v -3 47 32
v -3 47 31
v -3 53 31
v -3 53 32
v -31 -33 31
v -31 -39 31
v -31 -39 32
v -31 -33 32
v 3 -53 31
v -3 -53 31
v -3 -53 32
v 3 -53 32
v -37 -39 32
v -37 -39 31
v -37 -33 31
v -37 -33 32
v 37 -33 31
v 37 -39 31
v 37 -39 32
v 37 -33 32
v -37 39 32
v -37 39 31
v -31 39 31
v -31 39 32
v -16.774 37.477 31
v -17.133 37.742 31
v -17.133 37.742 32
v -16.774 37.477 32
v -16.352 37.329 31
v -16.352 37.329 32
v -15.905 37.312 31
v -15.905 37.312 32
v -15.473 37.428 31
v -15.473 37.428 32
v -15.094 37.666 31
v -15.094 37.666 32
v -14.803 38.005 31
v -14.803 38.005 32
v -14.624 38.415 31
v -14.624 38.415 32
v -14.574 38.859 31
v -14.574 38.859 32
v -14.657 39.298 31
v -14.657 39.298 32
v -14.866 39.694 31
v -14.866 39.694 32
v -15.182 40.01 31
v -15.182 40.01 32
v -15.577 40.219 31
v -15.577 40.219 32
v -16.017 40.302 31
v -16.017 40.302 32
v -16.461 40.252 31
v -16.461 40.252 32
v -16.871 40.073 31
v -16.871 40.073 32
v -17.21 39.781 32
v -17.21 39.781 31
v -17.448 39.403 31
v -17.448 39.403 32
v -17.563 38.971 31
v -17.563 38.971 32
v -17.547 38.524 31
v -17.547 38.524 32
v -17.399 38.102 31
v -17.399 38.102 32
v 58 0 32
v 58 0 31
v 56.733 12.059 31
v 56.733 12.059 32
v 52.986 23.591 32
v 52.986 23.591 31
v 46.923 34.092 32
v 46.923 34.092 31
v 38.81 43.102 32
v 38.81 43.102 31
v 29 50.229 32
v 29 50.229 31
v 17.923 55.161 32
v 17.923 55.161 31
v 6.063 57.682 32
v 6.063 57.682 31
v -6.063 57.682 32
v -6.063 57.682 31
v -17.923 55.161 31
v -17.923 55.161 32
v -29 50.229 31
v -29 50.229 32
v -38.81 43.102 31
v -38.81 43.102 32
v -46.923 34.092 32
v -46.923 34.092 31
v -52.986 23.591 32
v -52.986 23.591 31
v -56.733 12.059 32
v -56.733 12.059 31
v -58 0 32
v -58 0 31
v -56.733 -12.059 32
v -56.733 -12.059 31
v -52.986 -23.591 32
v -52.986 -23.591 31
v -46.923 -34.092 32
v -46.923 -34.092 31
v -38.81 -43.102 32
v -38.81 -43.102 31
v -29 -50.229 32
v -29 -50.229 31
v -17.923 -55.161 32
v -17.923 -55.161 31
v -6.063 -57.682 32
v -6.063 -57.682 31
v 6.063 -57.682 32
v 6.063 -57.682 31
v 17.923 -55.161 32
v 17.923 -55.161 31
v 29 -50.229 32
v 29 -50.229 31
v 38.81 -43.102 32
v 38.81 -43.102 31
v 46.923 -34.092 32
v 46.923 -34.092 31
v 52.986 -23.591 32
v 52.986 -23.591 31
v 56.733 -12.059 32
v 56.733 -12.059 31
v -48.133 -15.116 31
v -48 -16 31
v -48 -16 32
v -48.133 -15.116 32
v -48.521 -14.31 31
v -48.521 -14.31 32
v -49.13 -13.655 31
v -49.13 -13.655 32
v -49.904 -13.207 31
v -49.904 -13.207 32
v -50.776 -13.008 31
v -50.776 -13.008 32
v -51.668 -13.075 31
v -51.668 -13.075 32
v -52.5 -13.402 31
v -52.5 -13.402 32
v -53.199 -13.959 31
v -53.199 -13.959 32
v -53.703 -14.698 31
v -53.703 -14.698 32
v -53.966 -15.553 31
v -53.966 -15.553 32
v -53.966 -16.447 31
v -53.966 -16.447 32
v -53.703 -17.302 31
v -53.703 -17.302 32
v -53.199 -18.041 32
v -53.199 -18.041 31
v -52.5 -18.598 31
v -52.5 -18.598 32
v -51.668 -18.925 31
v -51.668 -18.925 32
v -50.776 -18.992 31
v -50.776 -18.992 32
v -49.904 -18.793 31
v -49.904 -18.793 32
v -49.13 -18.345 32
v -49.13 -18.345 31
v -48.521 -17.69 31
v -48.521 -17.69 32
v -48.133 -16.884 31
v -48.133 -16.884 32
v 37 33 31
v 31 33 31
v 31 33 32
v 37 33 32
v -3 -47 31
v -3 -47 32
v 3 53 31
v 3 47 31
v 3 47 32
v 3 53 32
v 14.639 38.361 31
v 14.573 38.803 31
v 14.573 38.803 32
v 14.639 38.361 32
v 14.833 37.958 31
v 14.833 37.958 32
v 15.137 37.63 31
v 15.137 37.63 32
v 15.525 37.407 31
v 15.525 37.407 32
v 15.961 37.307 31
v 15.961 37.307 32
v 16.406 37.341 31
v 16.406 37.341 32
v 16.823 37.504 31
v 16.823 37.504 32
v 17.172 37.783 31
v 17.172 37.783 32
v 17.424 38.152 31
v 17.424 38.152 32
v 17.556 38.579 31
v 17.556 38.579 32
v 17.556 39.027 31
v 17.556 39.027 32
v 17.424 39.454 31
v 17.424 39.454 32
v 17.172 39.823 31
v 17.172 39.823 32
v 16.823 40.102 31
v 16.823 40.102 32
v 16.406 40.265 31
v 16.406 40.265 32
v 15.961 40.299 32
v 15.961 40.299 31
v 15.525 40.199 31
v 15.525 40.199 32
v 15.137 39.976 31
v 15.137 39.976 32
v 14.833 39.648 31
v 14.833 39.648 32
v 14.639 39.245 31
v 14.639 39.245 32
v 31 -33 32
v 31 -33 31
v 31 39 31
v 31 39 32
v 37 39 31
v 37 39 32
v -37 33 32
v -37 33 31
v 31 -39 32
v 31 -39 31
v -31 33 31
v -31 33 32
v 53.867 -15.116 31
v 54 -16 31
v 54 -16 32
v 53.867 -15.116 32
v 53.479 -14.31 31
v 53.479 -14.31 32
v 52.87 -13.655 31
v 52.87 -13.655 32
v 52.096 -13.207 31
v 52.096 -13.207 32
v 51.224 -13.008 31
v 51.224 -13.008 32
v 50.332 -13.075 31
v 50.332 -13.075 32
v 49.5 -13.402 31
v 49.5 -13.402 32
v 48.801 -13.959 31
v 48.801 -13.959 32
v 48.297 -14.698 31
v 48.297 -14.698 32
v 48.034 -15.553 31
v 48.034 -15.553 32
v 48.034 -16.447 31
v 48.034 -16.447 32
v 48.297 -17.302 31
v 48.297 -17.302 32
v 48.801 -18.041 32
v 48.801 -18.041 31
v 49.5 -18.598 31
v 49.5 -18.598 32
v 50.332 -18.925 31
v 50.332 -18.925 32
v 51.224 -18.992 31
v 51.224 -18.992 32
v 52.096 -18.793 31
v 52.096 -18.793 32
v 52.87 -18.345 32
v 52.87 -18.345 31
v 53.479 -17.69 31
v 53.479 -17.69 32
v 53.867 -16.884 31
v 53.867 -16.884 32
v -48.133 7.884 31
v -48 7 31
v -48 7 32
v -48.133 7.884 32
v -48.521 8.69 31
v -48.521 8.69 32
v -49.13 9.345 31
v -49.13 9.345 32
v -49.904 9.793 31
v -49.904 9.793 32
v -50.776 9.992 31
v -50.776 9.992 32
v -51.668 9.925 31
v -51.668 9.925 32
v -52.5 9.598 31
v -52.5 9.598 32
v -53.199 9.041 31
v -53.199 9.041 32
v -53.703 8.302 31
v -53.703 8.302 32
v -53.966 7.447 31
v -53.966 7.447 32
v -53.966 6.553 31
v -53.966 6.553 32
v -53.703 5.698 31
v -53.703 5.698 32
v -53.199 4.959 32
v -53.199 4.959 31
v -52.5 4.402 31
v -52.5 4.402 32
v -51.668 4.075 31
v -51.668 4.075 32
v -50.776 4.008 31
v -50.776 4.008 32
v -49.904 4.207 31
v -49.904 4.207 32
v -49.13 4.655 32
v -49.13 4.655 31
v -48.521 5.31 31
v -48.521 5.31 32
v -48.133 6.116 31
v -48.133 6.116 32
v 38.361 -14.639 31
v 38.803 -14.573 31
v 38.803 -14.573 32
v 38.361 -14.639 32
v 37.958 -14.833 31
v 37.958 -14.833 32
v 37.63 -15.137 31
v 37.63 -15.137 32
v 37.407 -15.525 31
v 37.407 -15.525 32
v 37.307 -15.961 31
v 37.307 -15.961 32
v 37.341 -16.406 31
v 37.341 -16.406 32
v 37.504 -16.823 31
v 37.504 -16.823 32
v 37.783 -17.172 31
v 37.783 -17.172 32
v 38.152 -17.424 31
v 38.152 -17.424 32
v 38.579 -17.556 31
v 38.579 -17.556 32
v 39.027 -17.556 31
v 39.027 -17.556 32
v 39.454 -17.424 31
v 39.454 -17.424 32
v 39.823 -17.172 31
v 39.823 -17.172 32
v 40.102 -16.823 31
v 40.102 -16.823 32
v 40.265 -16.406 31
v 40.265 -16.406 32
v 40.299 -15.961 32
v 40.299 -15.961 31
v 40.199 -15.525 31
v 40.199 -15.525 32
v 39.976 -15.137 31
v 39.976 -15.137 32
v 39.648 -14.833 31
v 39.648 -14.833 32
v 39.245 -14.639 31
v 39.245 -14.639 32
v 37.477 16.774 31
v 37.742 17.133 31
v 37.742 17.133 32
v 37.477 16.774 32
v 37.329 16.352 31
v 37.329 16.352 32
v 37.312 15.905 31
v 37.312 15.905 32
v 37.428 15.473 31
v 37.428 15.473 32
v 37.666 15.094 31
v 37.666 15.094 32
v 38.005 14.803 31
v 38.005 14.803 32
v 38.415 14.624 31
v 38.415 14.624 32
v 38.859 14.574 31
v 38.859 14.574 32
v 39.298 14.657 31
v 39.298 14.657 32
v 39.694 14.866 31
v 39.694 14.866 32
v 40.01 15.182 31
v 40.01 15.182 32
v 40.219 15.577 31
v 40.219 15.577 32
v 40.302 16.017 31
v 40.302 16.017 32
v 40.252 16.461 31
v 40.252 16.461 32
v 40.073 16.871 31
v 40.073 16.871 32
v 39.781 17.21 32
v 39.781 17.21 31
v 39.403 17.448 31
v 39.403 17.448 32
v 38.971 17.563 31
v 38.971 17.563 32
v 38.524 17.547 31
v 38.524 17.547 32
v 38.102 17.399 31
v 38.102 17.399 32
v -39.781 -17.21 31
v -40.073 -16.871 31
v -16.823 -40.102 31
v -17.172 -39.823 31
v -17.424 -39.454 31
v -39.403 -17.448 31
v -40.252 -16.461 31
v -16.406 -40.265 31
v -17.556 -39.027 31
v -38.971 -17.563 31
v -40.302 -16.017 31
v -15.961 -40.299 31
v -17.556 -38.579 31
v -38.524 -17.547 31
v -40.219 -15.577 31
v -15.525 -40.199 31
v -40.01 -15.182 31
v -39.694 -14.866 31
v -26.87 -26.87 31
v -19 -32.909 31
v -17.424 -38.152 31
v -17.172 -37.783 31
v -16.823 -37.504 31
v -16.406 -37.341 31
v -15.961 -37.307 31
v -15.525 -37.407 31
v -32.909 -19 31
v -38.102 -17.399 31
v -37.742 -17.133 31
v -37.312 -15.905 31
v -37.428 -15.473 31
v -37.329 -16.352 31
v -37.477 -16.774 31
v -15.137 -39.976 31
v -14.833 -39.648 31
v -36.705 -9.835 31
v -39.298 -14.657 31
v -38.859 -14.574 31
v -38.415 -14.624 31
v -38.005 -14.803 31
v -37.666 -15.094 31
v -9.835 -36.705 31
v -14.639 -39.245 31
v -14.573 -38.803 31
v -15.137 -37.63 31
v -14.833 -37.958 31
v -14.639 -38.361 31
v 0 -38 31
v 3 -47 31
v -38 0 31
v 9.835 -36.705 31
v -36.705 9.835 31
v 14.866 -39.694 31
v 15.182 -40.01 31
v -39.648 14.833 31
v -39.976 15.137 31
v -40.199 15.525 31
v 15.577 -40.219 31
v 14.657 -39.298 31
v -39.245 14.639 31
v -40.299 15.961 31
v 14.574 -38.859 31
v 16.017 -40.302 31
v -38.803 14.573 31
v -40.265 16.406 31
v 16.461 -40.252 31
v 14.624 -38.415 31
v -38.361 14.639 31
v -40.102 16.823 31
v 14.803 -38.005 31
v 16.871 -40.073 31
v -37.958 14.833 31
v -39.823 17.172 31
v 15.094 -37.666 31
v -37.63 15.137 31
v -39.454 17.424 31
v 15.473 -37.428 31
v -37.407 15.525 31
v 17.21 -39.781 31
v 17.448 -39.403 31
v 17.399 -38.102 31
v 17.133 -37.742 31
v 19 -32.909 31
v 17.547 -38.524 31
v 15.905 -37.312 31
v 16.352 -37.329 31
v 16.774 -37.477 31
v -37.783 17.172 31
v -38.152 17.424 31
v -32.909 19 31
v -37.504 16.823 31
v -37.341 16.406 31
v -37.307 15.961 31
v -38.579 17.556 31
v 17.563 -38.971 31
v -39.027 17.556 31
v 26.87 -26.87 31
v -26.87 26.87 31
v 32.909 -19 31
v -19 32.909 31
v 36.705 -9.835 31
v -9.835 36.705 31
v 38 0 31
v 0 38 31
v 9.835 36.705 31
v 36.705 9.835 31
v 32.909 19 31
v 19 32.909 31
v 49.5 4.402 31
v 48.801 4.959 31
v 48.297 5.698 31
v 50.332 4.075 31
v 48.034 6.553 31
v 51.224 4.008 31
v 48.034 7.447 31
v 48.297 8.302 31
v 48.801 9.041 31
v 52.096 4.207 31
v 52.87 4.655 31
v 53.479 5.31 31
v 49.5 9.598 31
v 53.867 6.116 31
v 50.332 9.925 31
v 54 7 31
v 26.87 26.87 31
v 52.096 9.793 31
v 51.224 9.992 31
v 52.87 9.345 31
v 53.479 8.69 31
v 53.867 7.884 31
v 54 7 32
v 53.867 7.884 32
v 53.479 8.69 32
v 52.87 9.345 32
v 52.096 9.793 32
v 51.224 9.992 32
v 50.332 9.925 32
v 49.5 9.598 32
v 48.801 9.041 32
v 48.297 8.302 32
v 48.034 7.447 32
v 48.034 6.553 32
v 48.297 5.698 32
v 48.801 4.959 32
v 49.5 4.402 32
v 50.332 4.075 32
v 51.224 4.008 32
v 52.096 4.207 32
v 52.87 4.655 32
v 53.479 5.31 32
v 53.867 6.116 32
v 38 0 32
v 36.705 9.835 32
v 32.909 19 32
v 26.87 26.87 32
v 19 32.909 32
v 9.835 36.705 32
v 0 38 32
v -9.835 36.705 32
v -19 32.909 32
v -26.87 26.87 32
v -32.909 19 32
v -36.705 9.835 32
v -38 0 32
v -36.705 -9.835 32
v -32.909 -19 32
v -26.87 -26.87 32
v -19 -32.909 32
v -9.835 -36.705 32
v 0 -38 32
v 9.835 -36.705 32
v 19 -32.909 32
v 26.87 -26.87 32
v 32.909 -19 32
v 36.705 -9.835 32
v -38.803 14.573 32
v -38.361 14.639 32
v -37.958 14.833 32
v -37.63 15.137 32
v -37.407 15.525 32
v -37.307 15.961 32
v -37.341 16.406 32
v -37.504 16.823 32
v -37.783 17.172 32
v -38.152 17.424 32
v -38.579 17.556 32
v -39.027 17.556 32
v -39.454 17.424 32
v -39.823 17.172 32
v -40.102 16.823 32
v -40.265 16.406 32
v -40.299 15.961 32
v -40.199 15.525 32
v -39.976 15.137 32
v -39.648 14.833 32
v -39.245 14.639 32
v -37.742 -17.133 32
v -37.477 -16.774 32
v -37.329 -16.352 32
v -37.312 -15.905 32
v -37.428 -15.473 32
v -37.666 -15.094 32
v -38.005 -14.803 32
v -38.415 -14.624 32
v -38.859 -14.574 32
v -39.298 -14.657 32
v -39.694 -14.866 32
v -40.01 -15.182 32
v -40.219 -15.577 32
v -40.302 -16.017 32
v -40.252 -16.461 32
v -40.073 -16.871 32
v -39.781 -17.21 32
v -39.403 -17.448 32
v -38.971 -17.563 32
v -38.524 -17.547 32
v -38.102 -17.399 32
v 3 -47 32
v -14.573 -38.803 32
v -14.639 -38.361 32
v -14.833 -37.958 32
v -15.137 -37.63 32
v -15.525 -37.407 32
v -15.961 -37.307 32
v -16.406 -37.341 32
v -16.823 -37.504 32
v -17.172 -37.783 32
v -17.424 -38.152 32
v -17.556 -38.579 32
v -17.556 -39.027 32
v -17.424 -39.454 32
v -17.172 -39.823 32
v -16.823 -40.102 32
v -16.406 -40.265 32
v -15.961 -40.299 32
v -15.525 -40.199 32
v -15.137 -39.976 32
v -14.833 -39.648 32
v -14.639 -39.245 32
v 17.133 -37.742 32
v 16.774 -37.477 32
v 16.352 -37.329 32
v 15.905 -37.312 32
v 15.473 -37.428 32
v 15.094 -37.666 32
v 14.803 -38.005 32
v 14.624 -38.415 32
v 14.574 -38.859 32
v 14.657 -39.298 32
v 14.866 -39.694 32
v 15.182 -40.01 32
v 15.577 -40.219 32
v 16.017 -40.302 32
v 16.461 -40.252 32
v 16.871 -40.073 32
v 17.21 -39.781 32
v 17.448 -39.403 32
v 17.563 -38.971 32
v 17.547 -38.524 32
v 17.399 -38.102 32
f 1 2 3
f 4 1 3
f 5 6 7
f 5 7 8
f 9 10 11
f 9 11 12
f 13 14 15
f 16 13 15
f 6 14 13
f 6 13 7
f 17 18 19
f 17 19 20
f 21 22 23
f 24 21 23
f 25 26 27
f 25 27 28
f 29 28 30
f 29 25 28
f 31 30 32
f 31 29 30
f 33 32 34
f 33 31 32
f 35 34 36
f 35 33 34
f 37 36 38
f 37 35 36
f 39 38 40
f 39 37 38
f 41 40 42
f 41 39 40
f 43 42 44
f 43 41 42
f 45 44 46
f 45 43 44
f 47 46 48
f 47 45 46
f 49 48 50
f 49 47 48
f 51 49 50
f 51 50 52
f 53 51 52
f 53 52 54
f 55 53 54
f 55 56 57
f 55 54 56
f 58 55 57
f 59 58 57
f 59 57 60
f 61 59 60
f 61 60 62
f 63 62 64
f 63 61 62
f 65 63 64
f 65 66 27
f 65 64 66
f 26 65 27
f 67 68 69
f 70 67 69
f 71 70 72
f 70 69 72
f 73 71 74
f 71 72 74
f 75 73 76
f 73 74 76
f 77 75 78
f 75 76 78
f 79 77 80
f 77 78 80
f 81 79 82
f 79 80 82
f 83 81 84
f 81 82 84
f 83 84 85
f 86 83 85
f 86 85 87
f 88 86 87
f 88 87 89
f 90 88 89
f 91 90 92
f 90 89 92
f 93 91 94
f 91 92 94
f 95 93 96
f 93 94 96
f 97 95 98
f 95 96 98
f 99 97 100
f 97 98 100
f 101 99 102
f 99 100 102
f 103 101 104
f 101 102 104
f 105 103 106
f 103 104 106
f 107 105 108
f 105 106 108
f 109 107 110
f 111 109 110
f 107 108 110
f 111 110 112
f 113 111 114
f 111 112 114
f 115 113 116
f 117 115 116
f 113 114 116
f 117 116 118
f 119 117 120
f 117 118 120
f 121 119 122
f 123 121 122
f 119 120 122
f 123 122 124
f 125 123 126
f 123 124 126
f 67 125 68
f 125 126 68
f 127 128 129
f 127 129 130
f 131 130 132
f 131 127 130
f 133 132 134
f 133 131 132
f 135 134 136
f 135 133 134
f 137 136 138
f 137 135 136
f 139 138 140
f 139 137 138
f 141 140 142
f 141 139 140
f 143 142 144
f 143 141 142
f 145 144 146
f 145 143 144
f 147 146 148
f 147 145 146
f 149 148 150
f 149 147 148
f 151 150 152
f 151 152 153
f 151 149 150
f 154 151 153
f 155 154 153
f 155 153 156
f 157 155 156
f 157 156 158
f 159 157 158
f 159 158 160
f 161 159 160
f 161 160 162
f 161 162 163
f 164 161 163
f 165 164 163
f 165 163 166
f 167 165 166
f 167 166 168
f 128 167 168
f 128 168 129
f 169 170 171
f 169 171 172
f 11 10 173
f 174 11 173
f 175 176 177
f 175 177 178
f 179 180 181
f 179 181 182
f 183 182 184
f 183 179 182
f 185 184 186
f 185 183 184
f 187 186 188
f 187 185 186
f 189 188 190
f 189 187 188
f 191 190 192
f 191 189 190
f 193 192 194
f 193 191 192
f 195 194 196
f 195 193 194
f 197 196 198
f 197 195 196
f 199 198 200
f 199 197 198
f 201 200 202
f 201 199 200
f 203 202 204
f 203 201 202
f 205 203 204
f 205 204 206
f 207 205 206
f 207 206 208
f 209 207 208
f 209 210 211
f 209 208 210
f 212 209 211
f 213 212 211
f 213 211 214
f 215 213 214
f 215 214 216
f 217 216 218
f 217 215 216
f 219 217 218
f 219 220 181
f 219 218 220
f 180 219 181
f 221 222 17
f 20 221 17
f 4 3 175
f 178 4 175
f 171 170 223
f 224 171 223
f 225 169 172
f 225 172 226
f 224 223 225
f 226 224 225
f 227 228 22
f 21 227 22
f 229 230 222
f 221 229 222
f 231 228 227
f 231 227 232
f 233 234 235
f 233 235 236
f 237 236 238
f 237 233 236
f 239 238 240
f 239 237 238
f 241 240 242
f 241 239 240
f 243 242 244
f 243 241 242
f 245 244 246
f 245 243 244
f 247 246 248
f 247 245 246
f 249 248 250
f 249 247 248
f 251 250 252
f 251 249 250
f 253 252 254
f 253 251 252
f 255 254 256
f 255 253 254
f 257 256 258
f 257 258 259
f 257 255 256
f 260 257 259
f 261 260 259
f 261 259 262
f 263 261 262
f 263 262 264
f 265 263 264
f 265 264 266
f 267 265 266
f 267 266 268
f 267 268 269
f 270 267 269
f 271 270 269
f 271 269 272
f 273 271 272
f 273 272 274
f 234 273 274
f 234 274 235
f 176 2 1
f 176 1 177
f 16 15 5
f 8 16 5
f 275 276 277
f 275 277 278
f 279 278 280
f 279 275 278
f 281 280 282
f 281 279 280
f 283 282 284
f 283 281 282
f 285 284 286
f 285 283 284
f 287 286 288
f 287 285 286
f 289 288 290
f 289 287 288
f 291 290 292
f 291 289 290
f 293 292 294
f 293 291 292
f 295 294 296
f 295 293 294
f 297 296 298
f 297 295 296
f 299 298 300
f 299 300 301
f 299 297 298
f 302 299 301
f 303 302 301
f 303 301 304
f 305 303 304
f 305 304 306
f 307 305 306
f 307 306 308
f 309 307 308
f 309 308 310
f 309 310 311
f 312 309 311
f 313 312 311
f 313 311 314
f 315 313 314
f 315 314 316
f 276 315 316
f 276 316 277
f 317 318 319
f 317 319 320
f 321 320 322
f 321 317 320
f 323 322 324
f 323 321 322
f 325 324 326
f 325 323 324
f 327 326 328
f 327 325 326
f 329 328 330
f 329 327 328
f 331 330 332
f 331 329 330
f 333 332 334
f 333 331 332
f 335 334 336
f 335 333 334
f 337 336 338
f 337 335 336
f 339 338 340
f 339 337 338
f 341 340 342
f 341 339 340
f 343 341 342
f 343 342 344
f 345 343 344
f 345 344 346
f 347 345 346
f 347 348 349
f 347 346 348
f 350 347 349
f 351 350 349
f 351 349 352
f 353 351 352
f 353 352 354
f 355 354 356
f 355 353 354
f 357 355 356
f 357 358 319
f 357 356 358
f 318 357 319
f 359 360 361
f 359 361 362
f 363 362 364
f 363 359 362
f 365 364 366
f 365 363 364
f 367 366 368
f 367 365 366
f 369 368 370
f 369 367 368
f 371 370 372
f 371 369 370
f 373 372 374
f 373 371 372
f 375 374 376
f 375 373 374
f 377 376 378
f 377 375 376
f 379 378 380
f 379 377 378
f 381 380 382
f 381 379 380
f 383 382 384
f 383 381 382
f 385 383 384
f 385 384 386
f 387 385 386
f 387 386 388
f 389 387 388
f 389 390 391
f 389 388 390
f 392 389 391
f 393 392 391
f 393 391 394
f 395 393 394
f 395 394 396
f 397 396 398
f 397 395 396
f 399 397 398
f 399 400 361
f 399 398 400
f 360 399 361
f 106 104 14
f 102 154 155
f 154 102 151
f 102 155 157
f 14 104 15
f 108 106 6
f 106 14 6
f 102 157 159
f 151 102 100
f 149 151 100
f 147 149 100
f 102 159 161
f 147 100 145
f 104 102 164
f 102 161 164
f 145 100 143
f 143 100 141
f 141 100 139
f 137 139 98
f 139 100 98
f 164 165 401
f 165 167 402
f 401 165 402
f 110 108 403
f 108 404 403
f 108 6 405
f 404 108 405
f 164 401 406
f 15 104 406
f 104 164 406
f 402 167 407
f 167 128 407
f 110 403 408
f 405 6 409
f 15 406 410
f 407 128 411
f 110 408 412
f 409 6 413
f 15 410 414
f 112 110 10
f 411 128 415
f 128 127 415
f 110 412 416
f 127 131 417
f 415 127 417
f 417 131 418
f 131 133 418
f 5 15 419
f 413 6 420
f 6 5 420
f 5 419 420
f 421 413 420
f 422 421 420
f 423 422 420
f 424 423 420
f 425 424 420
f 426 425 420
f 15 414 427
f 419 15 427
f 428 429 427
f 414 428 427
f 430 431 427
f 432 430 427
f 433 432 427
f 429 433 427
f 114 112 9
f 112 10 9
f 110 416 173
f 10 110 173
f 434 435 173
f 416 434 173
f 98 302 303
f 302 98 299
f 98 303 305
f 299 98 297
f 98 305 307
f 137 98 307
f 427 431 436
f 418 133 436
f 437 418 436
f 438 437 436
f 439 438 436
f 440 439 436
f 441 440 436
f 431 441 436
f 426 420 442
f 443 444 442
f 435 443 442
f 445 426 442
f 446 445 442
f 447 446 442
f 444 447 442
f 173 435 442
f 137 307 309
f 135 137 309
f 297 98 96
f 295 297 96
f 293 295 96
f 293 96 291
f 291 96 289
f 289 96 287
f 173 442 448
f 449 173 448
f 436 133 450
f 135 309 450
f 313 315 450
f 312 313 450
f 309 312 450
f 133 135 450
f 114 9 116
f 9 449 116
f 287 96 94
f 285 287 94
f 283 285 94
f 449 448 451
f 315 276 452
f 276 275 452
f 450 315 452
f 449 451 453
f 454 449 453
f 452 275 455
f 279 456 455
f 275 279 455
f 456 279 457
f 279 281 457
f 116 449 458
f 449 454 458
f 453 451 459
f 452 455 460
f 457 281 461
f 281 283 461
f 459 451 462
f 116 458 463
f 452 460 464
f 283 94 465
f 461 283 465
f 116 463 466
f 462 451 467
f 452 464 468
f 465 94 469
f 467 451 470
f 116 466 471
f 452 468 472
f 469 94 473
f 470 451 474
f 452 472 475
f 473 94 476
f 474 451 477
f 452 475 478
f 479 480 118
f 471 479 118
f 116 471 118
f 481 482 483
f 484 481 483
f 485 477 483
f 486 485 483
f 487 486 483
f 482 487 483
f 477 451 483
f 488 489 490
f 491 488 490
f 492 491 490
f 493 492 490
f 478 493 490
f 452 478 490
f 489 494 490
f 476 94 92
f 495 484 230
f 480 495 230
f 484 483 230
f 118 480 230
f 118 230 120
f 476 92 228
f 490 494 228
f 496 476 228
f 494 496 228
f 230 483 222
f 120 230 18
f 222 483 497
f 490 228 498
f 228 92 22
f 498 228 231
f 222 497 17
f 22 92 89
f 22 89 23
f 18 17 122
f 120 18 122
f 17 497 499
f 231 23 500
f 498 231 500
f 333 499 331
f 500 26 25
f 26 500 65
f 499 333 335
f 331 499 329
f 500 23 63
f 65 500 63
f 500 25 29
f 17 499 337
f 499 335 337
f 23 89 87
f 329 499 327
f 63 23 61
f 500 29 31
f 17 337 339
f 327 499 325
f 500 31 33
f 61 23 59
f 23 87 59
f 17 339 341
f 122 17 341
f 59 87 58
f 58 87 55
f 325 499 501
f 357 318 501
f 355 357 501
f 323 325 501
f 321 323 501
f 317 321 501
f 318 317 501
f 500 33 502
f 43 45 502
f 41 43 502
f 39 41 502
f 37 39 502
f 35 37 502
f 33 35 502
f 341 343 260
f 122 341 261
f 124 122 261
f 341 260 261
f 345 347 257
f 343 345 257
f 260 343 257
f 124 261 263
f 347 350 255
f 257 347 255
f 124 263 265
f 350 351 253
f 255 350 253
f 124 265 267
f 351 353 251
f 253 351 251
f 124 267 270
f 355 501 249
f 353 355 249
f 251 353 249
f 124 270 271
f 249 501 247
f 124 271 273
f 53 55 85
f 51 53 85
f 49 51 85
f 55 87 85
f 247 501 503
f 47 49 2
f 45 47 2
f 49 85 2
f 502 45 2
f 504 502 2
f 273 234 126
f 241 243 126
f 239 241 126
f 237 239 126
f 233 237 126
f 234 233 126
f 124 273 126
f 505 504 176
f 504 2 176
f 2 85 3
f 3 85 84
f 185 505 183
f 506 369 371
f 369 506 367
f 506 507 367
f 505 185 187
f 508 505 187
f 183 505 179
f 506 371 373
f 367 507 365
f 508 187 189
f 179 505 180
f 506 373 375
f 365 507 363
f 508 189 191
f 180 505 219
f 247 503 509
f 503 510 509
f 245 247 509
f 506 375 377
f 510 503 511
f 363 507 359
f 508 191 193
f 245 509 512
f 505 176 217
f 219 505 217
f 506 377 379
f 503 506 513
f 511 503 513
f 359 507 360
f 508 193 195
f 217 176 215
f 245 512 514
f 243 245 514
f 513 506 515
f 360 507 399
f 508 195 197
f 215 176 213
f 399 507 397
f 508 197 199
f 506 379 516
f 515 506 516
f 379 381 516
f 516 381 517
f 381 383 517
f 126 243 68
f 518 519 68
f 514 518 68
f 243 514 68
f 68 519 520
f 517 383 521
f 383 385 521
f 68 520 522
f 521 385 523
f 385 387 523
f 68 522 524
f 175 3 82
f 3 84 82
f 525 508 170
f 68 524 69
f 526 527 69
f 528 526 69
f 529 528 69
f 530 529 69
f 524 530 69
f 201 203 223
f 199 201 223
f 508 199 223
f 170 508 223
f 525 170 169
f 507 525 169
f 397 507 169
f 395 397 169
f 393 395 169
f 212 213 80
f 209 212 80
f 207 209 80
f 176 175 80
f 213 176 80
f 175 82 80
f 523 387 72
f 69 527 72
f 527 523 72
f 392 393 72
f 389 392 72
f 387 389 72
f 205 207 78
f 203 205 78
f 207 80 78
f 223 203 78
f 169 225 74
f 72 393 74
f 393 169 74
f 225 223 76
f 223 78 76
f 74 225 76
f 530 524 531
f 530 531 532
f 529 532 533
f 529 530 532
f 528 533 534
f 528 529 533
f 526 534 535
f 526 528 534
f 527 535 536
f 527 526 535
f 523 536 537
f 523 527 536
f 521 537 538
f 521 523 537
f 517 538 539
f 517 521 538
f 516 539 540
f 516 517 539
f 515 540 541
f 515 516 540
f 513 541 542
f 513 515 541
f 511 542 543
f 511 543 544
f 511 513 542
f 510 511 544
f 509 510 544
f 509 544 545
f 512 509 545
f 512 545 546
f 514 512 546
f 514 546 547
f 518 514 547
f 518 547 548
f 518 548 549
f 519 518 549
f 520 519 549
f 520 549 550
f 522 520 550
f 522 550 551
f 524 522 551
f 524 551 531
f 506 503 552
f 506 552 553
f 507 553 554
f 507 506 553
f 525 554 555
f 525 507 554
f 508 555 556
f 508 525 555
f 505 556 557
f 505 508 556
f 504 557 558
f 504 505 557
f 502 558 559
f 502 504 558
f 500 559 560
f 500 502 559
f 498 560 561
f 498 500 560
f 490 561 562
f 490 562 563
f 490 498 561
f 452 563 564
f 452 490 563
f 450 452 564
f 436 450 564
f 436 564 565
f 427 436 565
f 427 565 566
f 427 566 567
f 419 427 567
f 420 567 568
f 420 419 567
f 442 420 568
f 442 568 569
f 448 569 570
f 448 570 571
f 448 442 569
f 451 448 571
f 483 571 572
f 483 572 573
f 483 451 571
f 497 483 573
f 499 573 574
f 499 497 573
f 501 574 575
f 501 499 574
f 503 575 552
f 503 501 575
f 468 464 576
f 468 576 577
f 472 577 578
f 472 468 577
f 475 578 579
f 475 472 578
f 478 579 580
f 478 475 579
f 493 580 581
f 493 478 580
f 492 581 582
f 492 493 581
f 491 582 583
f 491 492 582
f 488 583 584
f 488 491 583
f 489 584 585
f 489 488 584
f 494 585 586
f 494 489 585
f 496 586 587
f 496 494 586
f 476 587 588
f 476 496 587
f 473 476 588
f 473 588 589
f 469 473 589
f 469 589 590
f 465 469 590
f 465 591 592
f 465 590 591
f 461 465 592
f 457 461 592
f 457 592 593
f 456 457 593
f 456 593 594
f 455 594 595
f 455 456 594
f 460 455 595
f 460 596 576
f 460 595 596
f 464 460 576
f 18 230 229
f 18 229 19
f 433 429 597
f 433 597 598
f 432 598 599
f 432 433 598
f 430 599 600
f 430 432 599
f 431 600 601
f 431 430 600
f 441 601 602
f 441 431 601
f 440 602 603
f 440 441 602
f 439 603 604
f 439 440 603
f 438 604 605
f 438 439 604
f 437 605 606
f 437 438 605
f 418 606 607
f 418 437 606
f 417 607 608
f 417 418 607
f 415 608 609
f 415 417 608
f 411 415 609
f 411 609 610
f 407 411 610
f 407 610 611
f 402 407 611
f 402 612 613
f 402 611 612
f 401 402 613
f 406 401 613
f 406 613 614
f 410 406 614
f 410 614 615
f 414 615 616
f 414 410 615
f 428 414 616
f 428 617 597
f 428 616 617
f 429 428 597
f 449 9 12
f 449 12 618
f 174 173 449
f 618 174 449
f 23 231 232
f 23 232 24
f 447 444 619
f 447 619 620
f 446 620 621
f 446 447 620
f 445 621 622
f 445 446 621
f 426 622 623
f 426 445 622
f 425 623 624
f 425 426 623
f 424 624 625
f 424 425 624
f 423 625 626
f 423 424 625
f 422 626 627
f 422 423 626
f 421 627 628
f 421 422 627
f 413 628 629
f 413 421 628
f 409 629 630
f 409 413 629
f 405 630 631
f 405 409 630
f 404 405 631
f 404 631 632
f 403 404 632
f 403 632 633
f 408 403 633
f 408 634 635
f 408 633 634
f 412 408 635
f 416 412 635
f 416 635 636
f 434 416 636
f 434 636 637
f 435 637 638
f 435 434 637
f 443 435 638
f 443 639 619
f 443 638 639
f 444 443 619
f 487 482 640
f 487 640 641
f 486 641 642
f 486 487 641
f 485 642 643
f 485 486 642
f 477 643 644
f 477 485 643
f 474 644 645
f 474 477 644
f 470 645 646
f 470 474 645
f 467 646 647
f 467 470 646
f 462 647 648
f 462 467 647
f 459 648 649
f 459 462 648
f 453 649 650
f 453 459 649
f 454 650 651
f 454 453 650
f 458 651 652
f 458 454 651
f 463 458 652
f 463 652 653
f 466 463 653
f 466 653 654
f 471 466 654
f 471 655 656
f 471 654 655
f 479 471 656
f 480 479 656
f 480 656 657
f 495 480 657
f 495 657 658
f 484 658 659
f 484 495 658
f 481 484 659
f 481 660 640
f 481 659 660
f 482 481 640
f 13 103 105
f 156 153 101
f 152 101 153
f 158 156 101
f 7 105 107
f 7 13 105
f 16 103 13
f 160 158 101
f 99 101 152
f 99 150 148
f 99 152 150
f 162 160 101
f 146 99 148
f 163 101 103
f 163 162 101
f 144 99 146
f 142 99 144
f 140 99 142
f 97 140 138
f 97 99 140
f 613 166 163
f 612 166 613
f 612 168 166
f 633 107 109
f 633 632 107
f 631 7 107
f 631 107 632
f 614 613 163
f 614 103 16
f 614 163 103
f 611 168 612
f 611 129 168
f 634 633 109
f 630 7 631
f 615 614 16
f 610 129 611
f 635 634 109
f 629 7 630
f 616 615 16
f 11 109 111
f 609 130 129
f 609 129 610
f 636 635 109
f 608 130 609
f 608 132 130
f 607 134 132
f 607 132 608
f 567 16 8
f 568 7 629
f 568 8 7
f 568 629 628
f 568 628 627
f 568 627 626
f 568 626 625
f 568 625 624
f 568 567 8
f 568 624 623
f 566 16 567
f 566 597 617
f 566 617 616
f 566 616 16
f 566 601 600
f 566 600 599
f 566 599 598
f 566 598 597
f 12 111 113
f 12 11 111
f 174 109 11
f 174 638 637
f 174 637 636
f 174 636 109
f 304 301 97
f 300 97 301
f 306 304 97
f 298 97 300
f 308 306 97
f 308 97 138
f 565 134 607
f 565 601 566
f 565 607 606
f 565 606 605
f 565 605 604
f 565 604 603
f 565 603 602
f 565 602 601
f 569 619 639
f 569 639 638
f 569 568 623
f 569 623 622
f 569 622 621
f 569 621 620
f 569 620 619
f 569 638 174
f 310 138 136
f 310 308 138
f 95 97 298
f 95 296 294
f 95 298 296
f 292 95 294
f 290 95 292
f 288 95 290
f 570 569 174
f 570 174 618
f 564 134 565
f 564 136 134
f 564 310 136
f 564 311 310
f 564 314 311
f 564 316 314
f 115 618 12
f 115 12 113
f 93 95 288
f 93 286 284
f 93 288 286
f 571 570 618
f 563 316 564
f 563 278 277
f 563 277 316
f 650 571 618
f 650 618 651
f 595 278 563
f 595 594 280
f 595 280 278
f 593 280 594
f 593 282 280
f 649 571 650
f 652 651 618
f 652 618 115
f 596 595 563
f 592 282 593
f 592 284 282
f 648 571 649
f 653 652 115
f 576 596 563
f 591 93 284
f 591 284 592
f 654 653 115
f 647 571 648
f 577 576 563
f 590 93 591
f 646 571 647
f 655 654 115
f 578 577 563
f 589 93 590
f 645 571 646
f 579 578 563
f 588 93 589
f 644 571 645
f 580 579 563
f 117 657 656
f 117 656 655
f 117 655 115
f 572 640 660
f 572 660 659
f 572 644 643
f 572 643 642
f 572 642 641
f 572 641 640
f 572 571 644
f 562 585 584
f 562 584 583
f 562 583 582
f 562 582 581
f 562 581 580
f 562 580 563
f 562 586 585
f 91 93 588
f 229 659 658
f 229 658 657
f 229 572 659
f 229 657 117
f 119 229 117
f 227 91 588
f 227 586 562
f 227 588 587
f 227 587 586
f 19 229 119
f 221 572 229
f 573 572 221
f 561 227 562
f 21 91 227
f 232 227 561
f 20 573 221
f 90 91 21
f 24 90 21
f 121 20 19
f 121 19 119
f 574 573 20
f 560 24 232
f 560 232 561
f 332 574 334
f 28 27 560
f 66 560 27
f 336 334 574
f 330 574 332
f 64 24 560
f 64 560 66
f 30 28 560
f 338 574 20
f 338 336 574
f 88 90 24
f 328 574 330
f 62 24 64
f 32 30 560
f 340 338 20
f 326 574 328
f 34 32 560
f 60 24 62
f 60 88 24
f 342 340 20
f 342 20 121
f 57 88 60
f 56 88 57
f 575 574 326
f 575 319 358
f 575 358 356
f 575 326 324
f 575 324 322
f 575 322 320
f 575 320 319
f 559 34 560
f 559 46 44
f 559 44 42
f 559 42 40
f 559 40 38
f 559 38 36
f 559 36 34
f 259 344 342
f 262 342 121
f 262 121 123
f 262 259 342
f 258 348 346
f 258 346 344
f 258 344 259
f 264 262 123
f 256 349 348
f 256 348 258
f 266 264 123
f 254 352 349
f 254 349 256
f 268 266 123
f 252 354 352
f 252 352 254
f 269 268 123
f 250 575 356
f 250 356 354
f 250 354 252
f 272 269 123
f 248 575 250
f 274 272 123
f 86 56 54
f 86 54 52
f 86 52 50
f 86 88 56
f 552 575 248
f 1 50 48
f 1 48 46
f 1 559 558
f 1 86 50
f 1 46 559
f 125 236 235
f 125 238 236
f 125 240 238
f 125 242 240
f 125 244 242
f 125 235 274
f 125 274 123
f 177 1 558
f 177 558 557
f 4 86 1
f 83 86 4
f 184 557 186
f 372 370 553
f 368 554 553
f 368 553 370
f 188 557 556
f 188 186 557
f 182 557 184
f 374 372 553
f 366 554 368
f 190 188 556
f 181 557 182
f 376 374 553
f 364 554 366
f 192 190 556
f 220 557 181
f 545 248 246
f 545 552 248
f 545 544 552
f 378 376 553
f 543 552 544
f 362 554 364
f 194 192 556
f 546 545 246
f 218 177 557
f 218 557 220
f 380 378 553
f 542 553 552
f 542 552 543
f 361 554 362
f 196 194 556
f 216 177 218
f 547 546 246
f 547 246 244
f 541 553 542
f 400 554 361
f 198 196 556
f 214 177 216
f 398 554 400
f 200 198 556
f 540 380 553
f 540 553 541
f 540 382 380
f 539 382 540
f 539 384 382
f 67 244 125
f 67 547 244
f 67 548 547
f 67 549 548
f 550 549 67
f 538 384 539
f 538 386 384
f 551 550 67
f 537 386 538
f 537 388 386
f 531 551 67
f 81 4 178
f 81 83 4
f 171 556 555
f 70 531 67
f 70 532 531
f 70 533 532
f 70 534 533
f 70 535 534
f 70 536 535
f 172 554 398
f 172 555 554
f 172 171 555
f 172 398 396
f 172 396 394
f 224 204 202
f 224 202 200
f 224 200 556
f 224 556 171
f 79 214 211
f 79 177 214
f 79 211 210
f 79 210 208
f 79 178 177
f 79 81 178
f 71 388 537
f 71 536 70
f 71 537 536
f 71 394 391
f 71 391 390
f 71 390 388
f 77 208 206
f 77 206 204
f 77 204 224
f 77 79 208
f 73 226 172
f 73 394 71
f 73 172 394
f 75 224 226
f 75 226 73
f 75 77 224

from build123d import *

# Parameters (mm, degrees)
CYLINDER445_R               = 1.5
CYLINDER445_DEPTH           = 100
CYLINDER446_R               = 1.5
CYLINDER446_DEPTH           = 100
CYLINDER446_PLACEMENT_ANGLE = 135
CYLINDER447_R               = 1.5
CYLINDER447_DEPTH           = 100
CYLINDER448_R               = 1.5
CYLINDER448_DEPTH           = 100
CYLINDER448_PLACEMENT_ANGLE = 225
CYLINDER449_R               = 1.5
CYLINDER449_DEPTH           = 100
CYLINDER450_R               = 1.5
CYLINDER450_DEPTH           = 100
CYLINDER450_PLACEMENT_ANGLE = 45
CYLINDER451_R               = 1.5
CYLINDER451_DEPTH           = 100
CYLINDER444_R               = 1.5
CYLINDER444_DEPTH           = 100
CYLINDER444_PLACEMENT_ANGLE = 45
BOX154_W                    = 6
BOX154_H                    = 6
BOX154_DEPTH                = 10
BOX151_W                    = 6
BOX151_H                    = 6
BOX151_DEPTH                = 10
BOX155_W                    = 6
BOX155_H                    = 6
BOX155_DEPTH                = 10
BOX153_W                    = 6
BOX153_H                    = 6
BOX153_DEPTH                = 10
BOX156_W                    = 6
BOX156_H                    = 6
BOX156_DEPTH                = 10
BOX152_W                    = 6
BOX152_H                    = 6
BOX152_DEPTH                = 10
CYLINDER407_R               = 3
CYLINDER407_DEPTH           = 7
CYLINDER405_R               = 3
CYLINDER405_DEPTH           = 7
CYLINDER404_R               = 3
CYLINDER404_DEPTH           = 7
CYLINDER406_R               = 3
CYLINDER406_DEPTH           = 7
TUBE020_R                   = 58
TUBE020_R_2                 = 38
TUBE020_DEPTH               = 1


with BuildPart() as v_lec445:
    # Cylinder445 → Cylinder445 (new body)
    with BuildSketch(Plane(origin=(38.80294, -16.072704, 0), x_dir=(0, 1, 0), z_dir=(0, 0, 1))):
        Circle(CYLINDER445_R)
    extrude(amount=CYLINDER445_DEPTH)


with BuildPart() as v_lec446:
    # Cylinder446 → Cylinder446 (new body)
    with BuildSketch(Plane.XY):
        Circle(CYLINDER446_R)
    extrude(amount=CYLINDER446_DEPTH)


with BuildPart() as v_lec446_1:
    # Cylinder446 placement: moved
    add(v_lec446.part.moved(Location((38.80294, 16.072704, 0))).rotate(Axis((38.80294, 16.072704, 0), (0, 0, 1)), CYLINDER446_PLACEMENT_ANGLE))


with BuildPart() as v_lec447:
    # Cylinder447 → Cylinder447 (new body)
    with BuildSketch(Plane(origin=(16.072704, 38.80294, 0), x_dir=(-1, 0, 0), z_dir=(0, 0, 1))):
        Circle(CYLINDER447_R)
    extrude(amount=CYLINDER447_DEPTH)


with BuildPart() as v_lec448:
    # Cylinder448 → Cylinder448 (new body)
    with BuildSketch(Plane.XY):
        Circle(CYLINDER448_R)
    extrude(amount=CYLINDER448_DEPTH)


with BuildPart() as v_lec448_1:
    # Cylinder448 placement: moved
    add(v_lec448.part.moved(Location((-16.072704, 38.80294, 0))).rotate(Axis((-16.072704, 38.80294, 0), (0, 0, 1)), CYLINDER448_PLACEMENT_ANGLE))


with BuildPart() as v_lec449:
    # Cylinder449 → Cylinder449 (new body)
    with BuildSketch(Plane(origin=(-38.80294, 16.072704, 0), x_dir=(0, -1, 0), z_dir=(0, 0, 1))):
        Circle(CYLINDER449_R)
    extrude(amount=CYLINDER449_DEPTH)


with BuildPart() as v_lec450:
    # Cylinder450 → Cylinder450 (new body)
    with BuildSketch(Plane.XY):
        Circle(CYLINDER450_R)
    extrude(amount=CYLINDER450_DEPTH)


with BuildPart() as v_lec450_1:
    # Cylinder450 placement: moved
    add(v_lec450.part.moved(Location((-38.80294, -16.072704, 0))).rotate(Axis((-38.80294, -16.072704, 0), (0, 0, -1)), CYLINDER450_PLACEMENT_ANGLE))


with BuildPart() as v_lec451:
    # Cylinder451 → Cylinder451 (new body)
    with BuildSketch(Plane(origin=(-16.072704, -38.80294, 0), x_dir=(1, 0, 0), z_dir=(0, 0, 1))):
        Circle(CYLINDER451_R)
    extrude(amount=CYLINDER451_DEPTH)


with BuildPart() as compound325:
    # Cylinder444 → Cylinder444 (new body)
    with BuildSketch(Plane.XY):
        Circle(CYLINDER444_R)
    extrude(amount=CYLINDER444_DEPTH)


with BuildPart() as compound325_1:
    # Cylinder444 placement: moved
    add(compound325.part.moved(Location((16.072704, -38.80294, 0))).rotate(Axis((16.072704, -38.80294, 0), (0, 0, 1)), CYLINDER444_PLACEMENT_ANGLE))

    # Compound325: union Válec445, Válec446, Válec447, Válec448, Válec449, Válec450, Válec451
    add(v_lec445.part)
    add(v_lec446_1.part)
    add(v_lec447.part)
    add(v_lec448_1.part)
    add(v_lec449.part)
    add(v_lec450_1.part)
    add(v_lec451.part)


with BuildPart() as krychle154:
    # Box154 → Box154 (new body)
    with BuildSketch(Plane(origin=(-37, -39, 40), x_dir=(1, 0, 0), z_dir=(0, 0, 1))):
        with Locations((3, 3)):
            Rectangle(BOX154_W, BOX154_H)
    extrude(amount=BOX154_DEPTH)


with BuildPart() as krychle151:
    # Box151 → Box151 (new body)
    with BuildSketch(Plane(origin=(-3, -53, 40), x_dir=(1, 0, 0), z_dir=(0, 0, 1))):
        with Locations((3, 3)):
            Rectangle(BOX151_W, BOX151_H)
    extrude(amount=BOX151_DEPTH)


with BuildPart() as krychle155:
    # Box155 → Box155 (new body)
    with BuildSketch(Plane(origin=(31, 33, 40), x_dir=(1, 0, 0), z_dir=(0, 0, 1))):
        with Locations((3, 3)):
            Rectangle(BOX155_W, BOX155_H)
    extrude(amount=BOX155_DEPTH)


with BuildPart() as krychle153:
    # Box153 → Box153 (new body)
    with BuildSketch(Plane(origin=(-37, 33, 40), x_dir=(1, 0, 0), z_dir=(0, 0, 1))):
        with Locations((3, 3)):
            Rectangle(BOX153_W, BOX153_H)
    extrude(amount=BOX153_DEPTH)


with BuildPart() as krychle156:
    # Box156 → Box156 (new body)
    with BuildSketch(Plane(origin=(31, -39, 40), x_dir=(1, 0, 0), z_dir=(0, 0, 1))):
        with Locations((3, 3)):
            Rectangle(BOX156_W, BOX156_H)
    extrude(amount=BOX156_DEPTH)


with BuildPart() as compound316:
    # Box152 → Box152 (new body)
    with BuildSketch(Plane(origin=(-3, 47, 40), x_dir=(1, 0, 0), z_dir=(0, 0, 1))):
        with Locations((3, 3)):
            Rectangle(BOX152_W, BOX152_H)
    extrude(amount=BOX152_DEPTH)

    # Compound316: union Krychle154, Krychle151, Krychle155, Krychle153, Krychle156
    add(krychle154.part)
    add(krychle151.part)
    add(krychle155.part)
    add(krychle153.part)
    add(krychle156.part)


with BuildPart() as compound316_1:
    # Compound316 placement: moved
    add(compound316.part.moved(Location((0, 0, -18))))


with BuildPart() as v_lec407:
    # Cylinder407 → Cylinder407 (new body)
    with BuildSketch(Plane(origin=(51, -16, 50), x_dir=(1, 0, 0), z_dir=(0, 0, 1))):
        Circle(CYLINDER407_R)
    extrude(amount=CYLINDER407_DEPTH)


with BuildPart() as v_lec405:
    # Cylinder405 → Cylinder405 (new body)
    with BuildSketch(Plane(origin=(51, 7, 50), x_dir=(1, 0, 0), z_dir=(0, 0, 1))):
        Circle(CYLINDER405_R)
    extrude(amount=CYLINDER405_DEPTH)


with BuildPart() as v_lec404:
    # Cylinder404 → Cylinder404 (new body)
    with BuildSketch(Plane(origin=(-51, 7, 50), x_dir=(1, 0, 0), z_dir=(0, 0, 1))):
        Circle(CYLINDER404_R)
    extrude(amount=CYLINDER404_DEPTH)


with BuildPart() as compound312:
    # Cylinder406 → Cylinder406 (new body)
    with BuildSketch(Plane(origin=(-51, -16, 50), x_dir=(1, 0, 0), z_dir=(0, 0, 1))):
        Circle(CYLINDER406_R)
    extrude(amount=CYLINDER406_DEPTH)

    # Compound312: union Válec407, Válec405, Válec404
    add(v_lec407.part)
    add(v_lec405.part)
    add(v_lec404.part)


with BuildPart() as compound312_1:
    # Compound312 placement: moved
    add(compound312.part.moved(Location((0, 0, -25))))


with BuildPart() as cut173:
    # Tube020 → Tube020 (new body)
    with BuildSketch(Plane.XY.offset(31)):
        Circle(TUBE020_R)
        Circle(TUBE020_R_2, mode=Mode.SUBTRACT)
    extrude(amount=TUBE020_DEPTH)

    # Cut161: cut Compound312
    add(compound312_1.part, mode=Mode.SUBTRACT)

    # Cut163: cut Compound316
    add(compound316_1.part, mode=Mode.SUBTRACT)

    # Cut173: cut Compound325
    add(compound325_1.part, mode=Mode.SUBTRACT)


solid = cut173.part
